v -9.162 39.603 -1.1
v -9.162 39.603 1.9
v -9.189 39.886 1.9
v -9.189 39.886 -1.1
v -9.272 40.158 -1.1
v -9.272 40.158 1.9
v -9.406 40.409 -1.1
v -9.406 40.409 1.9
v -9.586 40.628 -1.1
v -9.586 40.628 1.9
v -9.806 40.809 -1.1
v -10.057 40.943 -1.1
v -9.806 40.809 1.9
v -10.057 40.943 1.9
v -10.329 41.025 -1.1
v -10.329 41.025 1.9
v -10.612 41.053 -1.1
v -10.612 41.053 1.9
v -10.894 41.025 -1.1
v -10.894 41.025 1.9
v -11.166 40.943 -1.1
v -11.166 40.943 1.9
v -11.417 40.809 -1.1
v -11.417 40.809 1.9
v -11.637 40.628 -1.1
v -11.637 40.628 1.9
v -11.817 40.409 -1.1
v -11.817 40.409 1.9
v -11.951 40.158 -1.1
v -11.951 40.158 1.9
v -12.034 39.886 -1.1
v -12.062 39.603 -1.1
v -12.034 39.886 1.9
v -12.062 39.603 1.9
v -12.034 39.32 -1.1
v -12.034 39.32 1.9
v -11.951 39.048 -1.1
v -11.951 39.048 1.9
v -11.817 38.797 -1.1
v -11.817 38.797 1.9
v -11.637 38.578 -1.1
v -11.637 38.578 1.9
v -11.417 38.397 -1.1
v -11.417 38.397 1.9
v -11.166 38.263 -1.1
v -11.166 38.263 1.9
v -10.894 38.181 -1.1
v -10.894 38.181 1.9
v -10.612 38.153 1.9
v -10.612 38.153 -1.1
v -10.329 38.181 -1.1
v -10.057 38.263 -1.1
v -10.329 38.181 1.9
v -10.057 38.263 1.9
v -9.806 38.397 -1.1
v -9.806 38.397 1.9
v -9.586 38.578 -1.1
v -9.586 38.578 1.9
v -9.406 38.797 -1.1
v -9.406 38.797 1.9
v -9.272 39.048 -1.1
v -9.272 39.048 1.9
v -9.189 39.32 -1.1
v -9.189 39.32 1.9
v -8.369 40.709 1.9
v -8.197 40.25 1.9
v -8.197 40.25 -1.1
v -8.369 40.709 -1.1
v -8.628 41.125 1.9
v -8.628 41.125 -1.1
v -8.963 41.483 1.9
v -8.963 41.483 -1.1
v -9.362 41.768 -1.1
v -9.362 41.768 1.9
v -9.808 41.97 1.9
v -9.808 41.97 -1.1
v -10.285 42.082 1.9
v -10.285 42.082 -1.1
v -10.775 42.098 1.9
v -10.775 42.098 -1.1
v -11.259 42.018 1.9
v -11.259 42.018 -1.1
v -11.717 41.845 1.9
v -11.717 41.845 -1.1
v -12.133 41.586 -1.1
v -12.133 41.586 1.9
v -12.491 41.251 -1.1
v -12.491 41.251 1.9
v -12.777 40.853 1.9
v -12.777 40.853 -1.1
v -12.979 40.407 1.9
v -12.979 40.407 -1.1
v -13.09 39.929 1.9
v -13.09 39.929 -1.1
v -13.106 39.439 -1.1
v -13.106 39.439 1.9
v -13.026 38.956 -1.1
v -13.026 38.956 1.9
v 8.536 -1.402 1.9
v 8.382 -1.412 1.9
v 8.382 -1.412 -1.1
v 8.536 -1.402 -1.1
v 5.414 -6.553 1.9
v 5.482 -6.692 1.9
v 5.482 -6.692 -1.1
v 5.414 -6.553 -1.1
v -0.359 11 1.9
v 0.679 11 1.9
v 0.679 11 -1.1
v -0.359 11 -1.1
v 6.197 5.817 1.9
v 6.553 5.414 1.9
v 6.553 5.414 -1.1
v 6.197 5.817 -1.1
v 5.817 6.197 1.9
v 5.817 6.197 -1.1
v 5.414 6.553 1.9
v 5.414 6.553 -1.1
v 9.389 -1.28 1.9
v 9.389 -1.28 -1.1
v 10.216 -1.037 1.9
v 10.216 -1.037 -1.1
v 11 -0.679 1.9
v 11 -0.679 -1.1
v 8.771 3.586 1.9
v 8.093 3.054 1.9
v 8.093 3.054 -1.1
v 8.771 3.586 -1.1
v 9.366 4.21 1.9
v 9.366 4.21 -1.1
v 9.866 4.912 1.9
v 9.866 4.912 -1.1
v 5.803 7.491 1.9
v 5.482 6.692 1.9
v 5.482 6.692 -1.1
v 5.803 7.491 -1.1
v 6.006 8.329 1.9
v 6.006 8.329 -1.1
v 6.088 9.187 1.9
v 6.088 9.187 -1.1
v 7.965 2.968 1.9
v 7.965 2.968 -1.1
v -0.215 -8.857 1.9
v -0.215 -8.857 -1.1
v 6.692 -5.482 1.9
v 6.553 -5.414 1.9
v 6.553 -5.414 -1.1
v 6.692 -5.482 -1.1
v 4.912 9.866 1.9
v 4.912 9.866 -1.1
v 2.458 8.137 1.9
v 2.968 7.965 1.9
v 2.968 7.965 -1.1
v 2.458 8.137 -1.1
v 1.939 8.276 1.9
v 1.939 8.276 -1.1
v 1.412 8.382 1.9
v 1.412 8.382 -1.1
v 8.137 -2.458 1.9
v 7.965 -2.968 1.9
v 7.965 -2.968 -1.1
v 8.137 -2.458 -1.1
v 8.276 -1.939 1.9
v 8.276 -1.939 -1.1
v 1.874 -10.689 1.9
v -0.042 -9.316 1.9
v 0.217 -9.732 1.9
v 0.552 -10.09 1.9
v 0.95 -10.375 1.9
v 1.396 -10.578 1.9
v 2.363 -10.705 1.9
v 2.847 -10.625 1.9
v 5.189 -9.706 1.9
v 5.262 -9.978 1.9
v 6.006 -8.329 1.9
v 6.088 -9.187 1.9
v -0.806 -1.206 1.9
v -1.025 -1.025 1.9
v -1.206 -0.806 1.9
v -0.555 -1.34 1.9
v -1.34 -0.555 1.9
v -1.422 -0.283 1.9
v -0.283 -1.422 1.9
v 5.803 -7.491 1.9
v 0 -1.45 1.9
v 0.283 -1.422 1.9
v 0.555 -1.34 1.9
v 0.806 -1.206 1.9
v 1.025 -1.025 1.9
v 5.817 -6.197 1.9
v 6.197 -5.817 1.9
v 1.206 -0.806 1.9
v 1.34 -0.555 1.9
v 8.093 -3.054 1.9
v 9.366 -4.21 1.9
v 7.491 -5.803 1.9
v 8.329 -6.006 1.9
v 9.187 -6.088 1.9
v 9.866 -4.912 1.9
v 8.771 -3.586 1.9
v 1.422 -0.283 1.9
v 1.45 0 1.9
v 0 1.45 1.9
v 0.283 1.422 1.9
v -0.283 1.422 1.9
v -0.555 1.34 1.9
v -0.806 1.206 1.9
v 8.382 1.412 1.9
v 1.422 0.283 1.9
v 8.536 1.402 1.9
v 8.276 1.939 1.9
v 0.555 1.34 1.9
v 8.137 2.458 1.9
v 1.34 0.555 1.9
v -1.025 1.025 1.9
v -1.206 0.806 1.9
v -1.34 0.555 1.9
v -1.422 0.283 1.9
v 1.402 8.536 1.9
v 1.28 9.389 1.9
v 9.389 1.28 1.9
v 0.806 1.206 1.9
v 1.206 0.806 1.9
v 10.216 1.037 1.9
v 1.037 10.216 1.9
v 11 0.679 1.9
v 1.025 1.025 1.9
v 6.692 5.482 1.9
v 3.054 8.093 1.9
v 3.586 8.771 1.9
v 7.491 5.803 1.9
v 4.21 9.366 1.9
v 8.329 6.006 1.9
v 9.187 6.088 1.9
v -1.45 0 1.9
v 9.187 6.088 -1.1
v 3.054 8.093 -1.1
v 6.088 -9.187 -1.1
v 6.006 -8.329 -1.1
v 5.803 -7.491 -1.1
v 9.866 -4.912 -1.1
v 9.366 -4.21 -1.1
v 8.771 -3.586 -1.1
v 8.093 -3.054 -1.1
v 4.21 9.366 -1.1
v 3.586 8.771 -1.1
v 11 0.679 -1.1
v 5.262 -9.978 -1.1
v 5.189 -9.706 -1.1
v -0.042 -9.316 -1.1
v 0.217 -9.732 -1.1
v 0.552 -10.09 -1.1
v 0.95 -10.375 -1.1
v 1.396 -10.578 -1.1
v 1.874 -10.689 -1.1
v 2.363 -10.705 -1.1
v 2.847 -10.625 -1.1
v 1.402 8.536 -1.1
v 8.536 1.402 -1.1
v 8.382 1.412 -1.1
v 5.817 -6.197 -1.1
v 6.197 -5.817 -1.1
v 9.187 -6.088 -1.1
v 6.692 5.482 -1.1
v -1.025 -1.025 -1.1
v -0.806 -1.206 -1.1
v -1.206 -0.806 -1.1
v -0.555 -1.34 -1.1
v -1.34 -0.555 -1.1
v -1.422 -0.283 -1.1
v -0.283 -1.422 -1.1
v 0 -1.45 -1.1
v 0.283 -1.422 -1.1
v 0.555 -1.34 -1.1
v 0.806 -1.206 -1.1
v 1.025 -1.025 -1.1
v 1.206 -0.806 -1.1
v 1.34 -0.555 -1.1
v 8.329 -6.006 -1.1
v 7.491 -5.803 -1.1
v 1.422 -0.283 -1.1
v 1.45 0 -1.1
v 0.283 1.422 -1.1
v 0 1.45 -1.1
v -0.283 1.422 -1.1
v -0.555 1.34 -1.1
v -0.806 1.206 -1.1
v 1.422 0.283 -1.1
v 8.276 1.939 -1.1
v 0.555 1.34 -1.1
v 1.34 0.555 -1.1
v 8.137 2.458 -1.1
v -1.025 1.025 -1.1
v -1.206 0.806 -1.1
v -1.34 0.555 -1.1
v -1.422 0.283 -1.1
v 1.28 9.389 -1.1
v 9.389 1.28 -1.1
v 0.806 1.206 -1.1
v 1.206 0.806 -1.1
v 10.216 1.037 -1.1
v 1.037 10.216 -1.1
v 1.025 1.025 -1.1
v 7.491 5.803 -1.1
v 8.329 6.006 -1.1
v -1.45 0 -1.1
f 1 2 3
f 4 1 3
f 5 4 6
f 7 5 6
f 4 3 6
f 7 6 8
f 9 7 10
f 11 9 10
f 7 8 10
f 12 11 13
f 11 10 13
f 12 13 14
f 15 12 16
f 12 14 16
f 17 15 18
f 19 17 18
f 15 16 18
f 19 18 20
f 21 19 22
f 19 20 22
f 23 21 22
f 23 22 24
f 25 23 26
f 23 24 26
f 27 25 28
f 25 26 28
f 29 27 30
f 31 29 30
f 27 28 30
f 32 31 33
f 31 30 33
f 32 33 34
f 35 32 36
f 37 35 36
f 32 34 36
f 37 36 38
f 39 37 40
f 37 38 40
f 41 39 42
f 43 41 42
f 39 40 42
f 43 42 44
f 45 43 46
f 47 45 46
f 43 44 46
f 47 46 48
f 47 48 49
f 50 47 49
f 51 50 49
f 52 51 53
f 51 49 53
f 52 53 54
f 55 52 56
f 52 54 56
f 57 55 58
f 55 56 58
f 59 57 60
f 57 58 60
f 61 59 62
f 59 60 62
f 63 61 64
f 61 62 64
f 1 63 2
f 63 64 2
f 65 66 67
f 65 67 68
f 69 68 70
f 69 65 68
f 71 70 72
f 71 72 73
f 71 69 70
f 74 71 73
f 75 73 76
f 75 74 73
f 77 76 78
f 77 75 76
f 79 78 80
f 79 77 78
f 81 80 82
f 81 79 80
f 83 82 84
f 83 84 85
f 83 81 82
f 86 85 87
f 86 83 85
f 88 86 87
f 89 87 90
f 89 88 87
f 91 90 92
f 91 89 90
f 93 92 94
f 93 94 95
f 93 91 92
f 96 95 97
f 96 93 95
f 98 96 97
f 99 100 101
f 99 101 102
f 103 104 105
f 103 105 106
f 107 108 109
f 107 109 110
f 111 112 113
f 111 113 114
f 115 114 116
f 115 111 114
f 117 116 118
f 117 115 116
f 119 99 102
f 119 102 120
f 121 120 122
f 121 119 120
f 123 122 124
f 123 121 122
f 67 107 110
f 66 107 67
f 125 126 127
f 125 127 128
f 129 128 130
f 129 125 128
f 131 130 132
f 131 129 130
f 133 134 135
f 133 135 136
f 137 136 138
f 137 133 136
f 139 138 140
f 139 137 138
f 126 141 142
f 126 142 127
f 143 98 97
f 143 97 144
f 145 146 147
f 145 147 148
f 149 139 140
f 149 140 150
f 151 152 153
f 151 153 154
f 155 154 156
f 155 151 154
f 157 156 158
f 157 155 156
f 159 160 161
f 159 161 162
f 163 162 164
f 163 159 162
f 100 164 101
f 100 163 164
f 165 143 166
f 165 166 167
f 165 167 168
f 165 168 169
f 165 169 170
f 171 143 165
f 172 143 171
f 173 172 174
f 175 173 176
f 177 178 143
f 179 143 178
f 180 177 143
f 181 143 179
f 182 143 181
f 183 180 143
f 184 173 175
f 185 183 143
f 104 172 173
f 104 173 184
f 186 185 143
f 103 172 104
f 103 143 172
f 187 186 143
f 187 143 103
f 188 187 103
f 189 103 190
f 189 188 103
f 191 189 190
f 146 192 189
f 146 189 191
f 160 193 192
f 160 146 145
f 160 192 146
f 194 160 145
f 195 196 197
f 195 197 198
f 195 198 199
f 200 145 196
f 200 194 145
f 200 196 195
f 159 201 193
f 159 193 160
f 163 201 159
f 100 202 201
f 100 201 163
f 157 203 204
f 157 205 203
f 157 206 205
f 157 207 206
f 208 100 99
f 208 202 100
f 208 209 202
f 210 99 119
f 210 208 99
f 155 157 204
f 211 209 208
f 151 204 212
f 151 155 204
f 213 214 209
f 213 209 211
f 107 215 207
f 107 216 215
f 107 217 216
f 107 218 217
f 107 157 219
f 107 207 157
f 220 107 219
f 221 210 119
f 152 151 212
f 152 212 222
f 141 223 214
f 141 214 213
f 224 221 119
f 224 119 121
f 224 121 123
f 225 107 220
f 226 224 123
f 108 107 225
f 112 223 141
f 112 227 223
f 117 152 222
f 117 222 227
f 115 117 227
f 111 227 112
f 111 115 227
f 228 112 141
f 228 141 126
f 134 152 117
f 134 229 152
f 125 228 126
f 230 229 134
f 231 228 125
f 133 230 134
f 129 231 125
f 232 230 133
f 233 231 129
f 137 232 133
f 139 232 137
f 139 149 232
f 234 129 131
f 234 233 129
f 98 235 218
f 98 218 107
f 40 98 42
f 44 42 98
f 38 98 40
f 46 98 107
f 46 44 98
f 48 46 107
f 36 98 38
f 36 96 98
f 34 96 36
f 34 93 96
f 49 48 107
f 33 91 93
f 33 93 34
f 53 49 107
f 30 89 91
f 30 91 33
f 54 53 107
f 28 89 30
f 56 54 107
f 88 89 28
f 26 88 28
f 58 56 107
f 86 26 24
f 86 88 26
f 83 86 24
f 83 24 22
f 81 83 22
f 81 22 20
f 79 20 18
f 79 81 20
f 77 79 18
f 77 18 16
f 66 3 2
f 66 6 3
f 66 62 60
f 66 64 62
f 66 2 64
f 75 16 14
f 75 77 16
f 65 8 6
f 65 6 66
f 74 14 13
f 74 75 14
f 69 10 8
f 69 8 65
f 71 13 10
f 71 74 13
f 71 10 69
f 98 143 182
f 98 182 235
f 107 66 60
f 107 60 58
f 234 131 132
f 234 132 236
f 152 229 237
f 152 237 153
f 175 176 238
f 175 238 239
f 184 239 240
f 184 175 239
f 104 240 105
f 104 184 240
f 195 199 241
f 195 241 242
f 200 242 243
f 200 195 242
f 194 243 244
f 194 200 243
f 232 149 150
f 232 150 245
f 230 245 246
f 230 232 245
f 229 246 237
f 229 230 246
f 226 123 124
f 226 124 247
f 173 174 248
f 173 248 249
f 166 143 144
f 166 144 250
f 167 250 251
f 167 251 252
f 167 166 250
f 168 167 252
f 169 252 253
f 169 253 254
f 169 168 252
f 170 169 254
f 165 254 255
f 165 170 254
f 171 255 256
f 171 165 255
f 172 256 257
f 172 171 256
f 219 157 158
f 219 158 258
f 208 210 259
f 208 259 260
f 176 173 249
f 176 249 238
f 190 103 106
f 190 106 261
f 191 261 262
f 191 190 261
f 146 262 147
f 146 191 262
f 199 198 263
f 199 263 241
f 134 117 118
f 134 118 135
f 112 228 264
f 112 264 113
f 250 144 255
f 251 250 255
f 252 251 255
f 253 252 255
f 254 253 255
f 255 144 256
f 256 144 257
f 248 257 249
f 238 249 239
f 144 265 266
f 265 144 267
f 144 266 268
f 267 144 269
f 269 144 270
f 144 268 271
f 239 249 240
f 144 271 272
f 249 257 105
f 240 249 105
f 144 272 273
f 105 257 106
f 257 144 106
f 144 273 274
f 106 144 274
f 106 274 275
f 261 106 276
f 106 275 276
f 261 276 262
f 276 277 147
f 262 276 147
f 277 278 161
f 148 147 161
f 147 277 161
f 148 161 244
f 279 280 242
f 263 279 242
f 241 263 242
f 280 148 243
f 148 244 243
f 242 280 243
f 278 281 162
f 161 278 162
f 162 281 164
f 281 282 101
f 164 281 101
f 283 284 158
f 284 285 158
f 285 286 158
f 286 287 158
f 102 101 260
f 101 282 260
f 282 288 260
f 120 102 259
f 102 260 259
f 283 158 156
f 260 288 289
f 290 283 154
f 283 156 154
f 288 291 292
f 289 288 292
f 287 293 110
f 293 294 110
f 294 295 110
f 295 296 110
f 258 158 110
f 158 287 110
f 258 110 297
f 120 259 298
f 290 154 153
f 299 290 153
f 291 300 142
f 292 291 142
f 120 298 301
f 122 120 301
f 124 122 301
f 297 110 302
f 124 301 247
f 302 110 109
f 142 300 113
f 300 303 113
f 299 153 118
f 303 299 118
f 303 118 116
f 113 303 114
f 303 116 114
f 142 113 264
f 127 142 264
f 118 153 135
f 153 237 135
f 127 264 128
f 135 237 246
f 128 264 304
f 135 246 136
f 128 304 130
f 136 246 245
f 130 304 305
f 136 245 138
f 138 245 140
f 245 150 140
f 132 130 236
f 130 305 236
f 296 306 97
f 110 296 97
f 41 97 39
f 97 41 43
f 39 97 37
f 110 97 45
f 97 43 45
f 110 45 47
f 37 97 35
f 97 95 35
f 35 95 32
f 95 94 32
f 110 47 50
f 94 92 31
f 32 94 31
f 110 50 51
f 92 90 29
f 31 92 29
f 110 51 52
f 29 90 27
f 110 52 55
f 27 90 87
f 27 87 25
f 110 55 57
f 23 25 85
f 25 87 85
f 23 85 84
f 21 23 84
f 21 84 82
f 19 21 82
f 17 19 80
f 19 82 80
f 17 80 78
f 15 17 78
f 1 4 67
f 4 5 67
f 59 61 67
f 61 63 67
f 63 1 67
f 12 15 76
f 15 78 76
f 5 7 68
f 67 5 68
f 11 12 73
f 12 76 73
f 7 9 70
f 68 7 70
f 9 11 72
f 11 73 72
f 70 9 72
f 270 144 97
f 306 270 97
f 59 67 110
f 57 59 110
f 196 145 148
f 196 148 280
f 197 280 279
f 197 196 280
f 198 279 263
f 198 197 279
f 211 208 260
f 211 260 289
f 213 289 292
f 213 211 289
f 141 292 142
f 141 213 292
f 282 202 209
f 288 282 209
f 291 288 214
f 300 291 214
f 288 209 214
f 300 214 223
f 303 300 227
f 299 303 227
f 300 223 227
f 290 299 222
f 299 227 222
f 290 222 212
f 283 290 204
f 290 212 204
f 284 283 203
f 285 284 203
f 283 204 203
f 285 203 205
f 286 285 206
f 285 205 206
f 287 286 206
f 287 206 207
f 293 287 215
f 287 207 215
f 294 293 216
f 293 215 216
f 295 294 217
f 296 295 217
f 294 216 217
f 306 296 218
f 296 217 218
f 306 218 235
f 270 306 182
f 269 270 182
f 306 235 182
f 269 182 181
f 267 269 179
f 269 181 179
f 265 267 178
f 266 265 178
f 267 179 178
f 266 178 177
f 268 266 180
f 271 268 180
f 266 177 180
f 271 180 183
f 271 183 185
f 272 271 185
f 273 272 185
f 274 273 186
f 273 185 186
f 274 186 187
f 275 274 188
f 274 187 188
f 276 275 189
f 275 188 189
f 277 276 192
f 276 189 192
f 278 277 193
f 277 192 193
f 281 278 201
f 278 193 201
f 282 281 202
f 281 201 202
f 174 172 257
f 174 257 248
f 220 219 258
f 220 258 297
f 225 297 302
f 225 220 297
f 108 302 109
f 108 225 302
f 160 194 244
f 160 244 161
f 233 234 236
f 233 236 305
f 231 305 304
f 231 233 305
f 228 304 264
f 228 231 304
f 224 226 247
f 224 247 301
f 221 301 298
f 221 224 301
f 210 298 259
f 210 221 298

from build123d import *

# Parameters (mm, degrees)
SKETCH1_R           = 1.45
BOSS_EXTRUDE1_DEPTH = 3


with BuildPart() as part:
    # Sketch1 → Boss-Extrude1 (new body)
    with BuildSketch(Plane.XY.offset(1.9)):
        with BuildLine():
            Line((-13.026395415, 38.955911265), (-0.214852682, -8.857417136))
            ThreePointArc((-0.214852682, -8.857417136), (0.949961883, -10.375433033), (2.847009496, -10.625184089))
            Line((2.847009496, -10.625184089), (5.261824062, -9.978136476))
            Line((5.261824062, -9.978136476), (5.188879797, -9.705904774))
            Line((5.188879797, -9.705904774), (6.08761429, -9.187020173))
            ThreePointArc((6.08761429, -9.187020173), (5.919814799, -7.906537121), (5.481893659, -6.691622066))
            Line((5.481893659, -6.691622066), (5.414116812, -6.552658937))
            ThreePointArc((5.414116812, -6.552658937), (6.01040764, -6.01040764), (6.552658937, -5.414116812))
            Line((6.552658937, -5.414116812), (6.691622066, -5.481893659))
            ThreePointArc((6.691622066, -5.481893659), (7.906537121, -5.919814799), (9.187020173, -6.08761429))
            Line((9.187020173, -6.08761429), (9.86553871, -4.91238571))
            ThreePointArc((9.86553871, -4.91238571), (9.079978562, -3.887354604), (8.093270203, -3.054167872))
            Line((8.093270203, -3.054167872), (7.965092167, -2.967710696))
            ThreePointArc((7.965092167, -2.967710696), (8.210369523, -2.199961883), (8.381827508, -1.41243323))
            Line((8.381827508, -1.41243323), (8.536061531, -1.401648137))
            ThreePointArc((8.536061531, -1.401648137), (9.807169402, -1.173441441), (11, -0.678518537))
            Line((11, -0.678518537), (11, 0.678518537))
            ThreePointArc((11, 0.678518537), (9.807169402, 1.173441441), (8.536061531, 1.401648137))
            Line((8.536061531, 1.401648137), (8.381827508, 1.41243323))
            ThreePointArc((8.381827508, 1.41243323), (8.210369523, 2.199961883), (7.965092167, 2.967710696))
            Line((7.965092167, 2.967710696), (8.093270203, 3.054167872))
            ThreePointArc((8.093270203, 3.054167872), (9.079978562, 3.887354604), (9.86553871, 4.91238571))
            Line((9.86553871, 4.91238571), (9.187020173, 6.08761429))
            ThreePointArc((9.187020173, 6.08761429), (7.906537121, 5.919814799), (6.691622066, 5.481893659))
            Line((6.691622066, 5.481893659), (6.552658937, 5.414116812))
            ThreePointArc((6.552658937, 5.414116812), (6.01040764, 6.01040764), (5.414116812, 6.552658937))
            Line((5.414116812, 6.552658937), (5.481893659, 6.691622066))
            ThreePointArc((5.481893659, 6.691622066), (5.919814799, 7.906537121), (6.08761429, 9.187020173))
            Line((6.08761429, 9.187020173), (4.91238571, 9.86553871))
            ThreePointArc((4.91238571, 9.86553871), (3.887354604, 9.079978562), (3.054167872, 8.093270203))
            Line((3.054167872, 8.093270203), (2.967710696, 7.965092167))
            ThreePointArc((2.967710696, 7.965092167), (2.199961883, 8.210369523), (1.41243323, 8.381827508))
            Line((1.41243323, 8.381827508), (1.401648136, 8.536061531))
            ThreePointArc((1.401648136, 8.536061531), (1.173441441, 9.807169402), (0.678518537, 11))
            Line((0.678518537, 11), (-0.359250666, 11))
            Line((-0.359250666, 11), (-8.196766283, 40.250006491))
            ThreePointArc((-8.196766283, 40.250006491), (-11.258628462, 42.017773444), (-13.026395415, 38.955911265))
        make_face()
        with Locations((-10.611580849, 39.602958878)):
            Circle(SKETCH1_R, mode=Mode.SUBTRACT)
        Circle(SKETCH1_R, mode=Mode.SUBTRACT)
    extrude(amount=-BOSS_EXTRUDE1_DEPTH)


solid = part.part
